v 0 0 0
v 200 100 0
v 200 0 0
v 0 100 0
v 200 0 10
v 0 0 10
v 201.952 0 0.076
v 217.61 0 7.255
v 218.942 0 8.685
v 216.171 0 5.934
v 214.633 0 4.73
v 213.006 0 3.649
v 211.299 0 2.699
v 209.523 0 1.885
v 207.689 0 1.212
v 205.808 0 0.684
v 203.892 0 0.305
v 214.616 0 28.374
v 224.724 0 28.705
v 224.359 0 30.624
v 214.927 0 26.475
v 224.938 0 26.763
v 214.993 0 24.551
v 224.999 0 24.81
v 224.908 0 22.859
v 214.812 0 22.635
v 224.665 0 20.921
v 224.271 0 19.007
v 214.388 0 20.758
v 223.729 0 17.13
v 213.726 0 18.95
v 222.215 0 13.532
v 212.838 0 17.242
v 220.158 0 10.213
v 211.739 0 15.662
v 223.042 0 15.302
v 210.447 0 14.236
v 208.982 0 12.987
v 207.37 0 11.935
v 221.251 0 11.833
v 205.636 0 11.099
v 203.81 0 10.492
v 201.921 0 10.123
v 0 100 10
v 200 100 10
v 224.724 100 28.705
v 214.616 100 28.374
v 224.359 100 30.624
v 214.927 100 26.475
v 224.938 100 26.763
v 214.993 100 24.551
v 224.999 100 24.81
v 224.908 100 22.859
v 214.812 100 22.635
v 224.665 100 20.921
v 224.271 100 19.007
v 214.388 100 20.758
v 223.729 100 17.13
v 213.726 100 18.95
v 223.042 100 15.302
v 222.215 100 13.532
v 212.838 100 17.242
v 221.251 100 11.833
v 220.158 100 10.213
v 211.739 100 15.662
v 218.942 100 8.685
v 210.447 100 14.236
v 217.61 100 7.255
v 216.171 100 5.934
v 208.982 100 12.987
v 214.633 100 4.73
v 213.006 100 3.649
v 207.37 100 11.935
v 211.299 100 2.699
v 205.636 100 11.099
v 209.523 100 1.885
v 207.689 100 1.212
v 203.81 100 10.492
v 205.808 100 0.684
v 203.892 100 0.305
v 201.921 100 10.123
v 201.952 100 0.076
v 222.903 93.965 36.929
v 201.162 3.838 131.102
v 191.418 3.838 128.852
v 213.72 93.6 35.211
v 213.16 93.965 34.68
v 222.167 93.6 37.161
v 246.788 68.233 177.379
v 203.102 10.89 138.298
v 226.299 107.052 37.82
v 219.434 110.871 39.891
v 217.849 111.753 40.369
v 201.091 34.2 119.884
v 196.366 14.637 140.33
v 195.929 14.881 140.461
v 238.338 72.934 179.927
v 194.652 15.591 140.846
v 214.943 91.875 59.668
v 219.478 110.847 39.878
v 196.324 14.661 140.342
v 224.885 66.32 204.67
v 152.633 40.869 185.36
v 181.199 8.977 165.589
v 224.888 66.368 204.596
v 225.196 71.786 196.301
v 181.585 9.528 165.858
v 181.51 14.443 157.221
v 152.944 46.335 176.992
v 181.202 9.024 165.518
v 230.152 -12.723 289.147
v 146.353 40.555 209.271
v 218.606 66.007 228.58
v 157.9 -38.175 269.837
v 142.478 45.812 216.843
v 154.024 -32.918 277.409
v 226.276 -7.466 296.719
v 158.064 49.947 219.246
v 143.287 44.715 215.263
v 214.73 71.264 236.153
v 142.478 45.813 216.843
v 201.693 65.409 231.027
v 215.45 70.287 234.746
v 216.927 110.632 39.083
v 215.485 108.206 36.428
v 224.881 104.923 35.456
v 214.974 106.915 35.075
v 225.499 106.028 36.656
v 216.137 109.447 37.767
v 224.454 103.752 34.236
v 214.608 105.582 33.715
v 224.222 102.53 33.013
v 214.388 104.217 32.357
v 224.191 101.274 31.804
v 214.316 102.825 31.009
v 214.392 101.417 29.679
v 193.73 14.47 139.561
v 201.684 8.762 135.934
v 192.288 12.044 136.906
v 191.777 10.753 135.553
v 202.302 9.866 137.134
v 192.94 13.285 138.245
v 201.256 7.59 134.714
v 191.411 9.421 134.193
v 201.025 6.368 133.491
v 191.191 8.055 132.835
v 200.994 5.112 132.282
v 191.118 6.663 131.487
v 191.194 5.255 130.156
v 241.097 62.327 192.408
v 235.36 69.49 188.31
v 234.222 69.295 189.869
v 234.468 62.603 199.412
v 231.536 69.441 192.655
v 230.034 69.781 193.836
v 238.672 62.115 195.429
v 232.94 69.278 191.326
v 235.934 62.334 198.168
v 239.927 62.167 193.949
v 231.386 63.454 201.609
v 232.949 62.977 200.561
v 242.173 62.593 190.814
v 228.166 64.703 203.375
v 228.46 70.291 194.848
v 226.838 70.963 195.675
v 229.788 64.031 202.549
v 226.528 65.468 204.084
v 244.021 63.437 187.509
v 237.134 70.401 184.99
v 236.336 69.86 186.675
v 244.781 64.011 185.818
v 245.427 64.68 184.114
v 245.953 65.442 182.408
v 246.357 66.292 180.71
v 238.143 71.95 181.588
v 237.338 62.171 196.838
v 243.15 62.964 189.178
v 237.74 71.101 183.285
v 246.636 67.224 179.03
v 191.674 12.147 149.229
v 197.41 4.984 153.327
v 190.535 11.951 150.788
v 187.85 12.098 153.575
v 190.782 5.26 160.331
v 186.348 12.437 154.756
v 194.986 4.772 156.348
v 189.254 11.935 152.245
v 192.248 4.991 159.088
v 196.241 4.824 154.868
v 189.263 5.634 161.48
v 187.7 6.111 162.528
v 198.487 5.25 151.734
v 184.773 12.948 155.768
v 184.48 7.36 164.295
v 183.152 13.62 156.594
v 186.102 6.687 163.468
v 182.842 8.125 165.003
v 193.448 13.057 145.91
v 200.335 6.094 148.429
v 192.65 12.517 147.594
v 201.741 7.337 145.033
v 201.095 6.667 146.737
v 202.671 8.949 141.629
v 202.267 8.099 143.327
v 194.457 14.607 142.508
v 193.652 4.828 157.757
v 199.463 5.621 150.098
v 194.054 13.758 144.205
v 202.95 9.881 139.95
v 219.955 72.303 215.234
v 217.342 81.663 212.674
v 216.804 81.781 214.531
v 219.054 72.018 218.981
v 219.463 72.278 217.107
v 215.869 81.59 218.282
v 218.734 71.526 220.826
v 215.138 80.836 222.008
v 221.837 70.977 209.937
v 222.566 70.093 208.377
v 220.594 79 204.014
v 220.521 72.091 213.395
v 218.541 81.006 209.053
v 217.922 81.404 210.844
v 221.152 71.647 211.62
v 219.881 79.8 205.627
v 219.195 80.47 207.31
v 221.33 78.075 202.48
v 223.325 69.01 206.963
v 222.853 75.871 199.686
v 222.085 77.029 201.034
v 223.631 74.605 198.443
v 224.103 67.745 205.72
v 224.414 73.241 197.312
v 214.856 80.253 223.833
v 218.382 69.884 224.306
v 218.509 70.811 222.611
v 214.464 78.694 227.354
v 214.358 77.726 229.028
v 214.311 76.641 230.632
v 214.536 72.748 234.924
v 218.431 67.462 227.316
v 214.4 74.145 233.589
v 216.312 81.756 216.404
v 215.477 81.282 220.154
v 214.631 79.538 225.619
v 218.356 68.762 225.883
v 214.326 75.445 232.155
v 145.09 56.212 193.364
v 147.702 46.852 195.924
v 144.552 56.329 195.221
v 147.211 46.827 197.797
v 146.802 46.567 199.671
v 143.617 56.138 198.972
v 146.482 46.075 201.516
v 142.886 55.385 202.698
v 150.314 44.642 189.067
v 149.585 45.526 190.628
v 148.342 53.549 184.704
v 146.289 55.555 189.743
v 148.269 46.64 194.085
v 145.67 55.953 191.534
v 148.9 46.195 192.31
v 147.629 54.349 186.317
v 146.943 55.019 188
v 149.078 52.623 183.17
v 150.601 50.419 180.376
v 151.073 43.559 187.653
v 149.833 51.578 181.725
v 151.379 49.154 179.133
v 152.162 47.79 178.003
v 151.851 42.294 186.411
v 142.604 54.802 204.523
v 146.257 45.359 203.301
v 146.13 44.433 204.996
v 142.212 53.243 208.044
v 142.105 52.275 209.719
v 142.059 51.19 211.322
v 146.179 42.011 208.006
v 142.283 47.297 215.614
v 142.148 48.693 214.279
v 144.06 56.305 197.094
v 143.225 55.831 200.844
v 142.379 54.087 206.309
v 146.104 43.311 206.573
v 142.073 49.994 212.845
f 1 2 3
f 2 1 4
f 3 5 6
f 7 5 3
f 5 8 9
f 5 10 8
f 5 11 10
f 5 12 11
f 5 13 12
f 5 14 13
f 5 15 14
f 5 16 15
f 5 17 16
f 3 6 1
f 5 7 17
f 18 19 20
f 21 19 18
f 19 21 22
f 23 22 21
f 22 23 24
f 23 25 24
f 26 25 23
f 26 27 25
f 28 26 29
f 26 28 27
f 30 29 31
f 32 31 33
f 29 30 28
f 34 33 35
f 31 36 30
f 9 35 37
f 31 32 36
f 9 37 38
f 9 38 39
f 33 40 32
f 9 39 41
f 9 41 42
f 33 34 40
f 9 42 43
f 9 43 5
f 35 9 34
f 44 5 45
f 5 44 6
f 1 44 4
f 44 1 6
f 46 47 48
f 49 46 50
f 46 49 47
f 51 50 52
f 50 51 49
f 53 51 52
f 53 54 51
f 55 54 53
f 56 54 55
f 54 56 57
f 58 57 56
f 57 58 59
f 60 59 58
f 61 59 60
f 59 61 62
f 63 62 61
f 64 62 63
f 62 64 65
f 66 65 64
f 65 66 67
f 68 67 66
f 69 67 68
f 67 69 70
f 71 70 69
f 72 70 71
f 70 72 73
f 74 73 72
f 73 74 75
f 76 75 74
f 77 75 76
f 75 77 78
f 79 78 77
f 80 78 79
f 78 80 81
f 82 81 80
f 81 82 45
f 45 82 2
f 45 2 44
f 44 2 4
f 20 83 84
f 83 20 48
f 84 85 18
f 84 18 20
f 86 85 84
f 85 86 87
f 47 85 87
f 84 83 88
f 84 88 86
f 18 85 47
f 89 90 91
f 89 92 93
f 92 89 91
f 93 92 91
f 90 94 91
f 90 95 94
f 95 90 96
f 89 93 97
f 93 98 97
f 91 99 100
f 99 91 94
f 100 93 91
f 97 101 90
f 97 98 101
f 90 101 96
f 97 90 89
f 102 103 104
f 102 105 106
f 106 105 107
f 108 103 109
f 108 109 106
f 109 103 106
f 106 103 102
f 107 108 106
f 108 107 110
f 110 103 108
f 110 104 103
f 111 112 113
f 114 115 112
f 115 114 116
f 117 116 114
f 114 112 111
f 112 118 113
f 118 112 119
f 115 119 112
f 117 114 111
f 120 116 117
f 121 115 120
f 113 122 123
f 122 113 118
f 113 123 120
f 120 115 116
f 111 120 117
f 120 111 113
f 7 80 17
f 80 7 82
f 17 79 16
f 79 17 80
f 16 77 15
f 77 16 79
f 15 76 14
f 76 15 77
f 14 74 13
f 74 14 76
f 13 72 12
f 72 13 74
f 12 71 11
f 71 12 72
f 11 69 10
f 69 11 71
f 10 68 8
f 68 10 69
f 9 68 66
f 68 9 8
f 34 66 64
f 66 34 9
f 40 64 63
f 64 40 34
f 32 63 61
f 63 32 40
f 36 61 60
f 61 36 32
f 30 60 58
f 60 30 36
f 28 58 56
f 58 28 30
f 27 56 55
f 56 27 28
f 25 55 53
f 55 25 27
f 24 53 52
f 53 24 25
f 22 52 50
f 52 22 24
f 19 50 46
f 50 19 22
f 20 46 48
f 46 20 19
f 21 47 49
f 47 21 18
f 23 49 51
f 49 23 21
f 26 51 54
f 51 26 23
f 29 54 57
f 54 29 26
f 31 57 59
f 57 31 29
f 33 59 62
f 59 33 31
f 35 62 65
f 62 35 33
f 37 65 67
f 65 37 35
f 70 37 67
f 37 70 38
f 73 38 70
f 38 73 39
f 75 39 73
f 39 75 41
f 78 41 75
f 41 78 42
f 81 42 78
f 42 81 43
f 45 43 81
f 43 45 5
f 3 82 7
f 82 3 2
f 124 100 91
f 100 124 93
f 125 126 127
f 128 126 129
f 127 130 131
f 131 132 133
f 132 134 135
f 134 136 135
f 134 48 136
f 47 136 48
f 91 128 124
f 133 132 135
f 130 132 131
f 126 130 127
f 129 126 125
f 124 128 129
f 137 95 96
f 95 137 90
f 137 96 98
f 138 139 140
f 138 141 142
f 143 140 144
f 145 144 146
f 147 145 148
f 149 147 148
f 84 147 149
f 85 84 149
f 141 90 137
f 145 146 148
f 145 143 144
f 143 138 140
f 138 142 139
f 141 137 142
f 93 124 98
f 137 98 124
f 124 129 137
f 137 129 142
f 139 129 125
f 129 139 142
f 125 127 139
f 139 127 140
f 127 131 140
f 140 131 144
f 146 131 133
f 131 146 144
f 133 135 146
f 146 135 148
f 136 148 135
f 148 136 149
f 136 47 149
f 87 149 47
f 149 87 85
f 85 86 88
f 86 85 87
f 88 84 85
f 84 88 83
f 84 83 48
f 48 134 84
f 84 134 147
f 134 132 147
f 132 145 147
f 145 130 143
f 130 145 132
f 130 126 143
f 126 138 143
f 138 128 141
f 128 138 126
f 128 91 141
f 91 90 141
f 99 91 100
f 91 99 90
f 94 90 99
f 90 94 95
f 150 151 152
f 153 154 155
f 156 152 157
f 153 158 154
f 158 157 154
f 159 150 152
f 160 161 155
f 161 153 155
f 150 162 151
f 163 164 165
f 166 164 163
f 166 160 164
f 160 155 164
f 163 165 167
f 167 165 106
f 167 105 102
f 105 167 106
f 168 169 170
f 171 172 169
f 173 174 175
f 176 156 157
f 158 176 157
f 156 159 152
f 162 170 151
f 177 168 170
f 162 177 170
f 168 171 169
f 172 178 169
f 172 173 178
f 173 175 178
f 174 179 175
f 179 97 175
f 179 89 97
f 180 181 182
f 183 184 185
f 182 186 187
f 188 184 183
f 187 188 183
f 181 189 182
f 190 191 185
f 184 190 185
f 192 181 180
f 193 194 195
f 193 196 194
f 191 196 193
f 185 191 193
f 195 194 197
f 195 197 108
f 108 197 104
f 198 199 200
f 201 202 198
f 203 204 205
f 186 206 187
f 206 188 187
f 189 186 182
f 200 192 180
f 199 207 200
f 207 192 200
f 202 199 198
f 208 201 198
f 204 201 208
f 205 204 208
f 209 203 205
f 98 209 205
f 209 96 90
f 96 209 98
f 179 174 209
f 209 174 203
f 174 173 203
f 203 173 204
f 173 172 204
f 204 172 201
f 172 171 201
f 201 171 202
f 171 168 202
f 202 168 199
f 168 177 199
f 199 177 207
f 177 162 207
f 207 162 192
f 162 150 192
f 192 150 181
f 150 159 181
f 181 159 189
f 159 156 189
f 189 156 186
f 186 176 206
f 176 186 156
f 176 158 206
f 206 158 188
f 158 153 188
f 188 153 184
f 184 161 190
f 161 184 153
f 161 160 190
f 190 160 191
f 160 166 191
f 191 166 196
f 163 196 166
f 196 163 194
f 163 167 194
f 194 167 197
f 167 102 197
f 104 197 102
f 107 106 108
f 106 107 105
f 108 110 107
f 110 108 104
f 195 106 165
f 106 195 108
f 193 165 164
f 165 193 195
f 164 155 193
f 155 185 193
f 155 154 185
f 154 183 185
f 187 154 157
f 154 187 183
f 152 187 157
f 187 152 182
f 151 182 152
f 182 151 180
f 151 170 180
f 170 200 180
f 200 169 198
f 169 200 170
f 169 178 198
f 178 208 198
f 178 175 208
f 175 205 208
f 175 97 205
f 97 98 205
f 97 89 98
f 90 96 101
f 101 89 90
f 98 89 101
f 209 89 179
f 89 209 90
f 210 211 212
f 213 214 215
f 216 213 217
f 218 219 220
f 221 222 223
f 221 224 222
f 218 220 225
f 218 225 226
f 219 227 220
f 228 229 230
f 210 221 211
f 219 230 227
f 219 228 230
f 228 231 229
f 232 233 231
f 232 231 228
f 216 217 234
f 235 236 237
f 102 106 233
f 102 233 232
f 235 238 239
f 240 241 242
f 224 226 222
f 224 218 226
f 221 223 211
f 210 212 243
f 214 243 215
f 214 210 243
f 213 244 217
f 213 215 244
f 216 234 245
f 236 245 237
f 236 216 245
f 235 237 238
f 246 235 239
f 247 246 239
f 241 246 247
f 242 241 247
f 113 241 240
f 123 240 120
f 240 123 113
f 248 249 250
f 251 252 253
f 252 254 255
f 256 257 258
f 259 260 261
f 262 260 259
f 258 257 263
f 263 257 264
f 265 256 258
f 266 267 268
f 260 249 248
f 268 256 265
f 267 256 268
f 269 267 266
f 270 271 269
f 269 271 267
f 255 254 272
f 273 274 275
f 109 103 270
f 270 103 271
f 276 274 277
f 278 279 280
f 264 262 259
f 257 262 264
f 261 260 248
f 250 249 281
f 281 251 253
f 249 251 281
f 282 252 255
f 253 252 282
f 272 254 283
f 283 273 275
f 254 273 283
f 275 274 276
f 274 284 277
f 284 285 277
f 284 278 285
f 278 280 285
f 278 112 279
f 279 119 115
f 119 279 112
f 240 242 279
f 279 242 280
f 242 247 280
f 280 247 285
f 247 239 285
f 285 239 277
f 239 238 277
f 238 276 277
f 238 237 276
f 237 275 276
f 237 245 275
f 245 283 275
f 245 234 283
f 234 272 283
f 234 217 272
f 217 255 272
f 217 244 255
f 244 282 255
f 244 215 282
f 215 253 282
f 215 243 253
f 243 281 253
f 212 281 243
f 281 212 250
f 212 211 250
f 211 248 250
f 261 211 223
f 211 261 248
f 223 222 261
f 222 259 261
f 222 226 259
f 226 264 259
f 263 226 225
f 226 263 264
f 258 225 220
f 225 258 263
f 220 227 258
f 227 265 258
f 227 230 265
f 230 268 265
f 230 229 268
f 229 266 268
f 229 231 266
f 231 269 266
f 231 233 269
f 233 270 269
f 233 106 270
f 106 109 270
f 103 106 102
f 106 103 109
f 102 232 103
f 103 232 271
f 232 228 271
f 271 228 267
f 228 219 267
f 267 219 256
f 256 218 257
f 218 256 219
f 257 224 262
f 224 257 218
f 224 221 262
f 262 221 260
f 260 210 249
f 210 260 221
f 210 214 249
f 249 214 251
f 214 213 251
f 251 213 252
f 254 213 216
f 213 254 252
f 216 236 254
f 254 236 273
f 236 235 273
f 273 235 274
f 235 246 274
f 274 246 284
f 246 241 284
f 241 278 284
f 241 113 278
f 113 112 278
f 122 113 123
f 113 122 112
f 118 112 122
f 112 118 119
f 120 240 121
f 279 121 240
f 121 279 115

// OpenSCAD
// Generated by Parametrix
ca_demoSheetFold2_facePattern_000 = [ [ 0.0000, 0.0000 ],[ 200.0000, 0.0000 ],[ 200.0000, 100.0000 ],[ 0.0000, 100.0000 ],[ 0.0000, 0.0000 ] ];
cb_demoSheetFold2_facePattern_000 = [  0, 1, 2, 3, 4 ];
ca_demoSheetFold2_facePattern_001 = [ [ 0.0000, 0.0000 ],[ 100.0000, 0.0000 ],[ 96.1618, 103.1209 ],[ 0.0000, 0.0000 ] ];
cb_demoSheetFold2_facePattern_001 = [  5, 6, 7, 8 ];
ca_demoSheetFold2_facePattern_002 = [ [ 0.0000, 0.0000 ],[ 82.0000, 0.0000 ],[ 31.7181, 137.3862 ],[ 0.0000, 0.0000 ] ];
cb_demoSheetFold2_facePattern_002 = [  9, 10, 11, 12 ];
ca_demoSheetFold2_facePattern_003 = [ [ 0.0000, 0.0000 ],[ 82.0000, 0.0000 ],[ 65.4940, 44.1762 ],[ 0.0000, 0.0000 ] ];
cb_demoSheetFold2_facePattern_003 = [  13, 14, 15, 16 ];
ca_demoSheetFold2_facePattern_004 = [ [ 0.0000, 0.0000 ],[ 100.0000, 0.0000 ],[ 100.0000, 79.0000 ],[ 0.0000, 79.0000 ],[ 0.0000, 0.0000 ] ];
cb_demoSheetFold2_facePattern_004 = [  17, 18, 19, 20, 21 ];
a_demoSheetFold2_facePattern = concat(ca_demoSheetFold2_facePattern_000, ca_demoSheetFold2_facePattern_001, ca_demoSheetFold2_facePattern_002, ca_demoSheetFold2_facePattern_003, ca_demoSheetFold2_facePattern_004);
b_demoSheetFold2_facePattern = [cb_demoSheetFold2_facePattern_000, cb_demoSheetFold2_facePattern_001, cb_demoSheetFold2_facePattern_002, cb_demoSheetFold2_facePattern_003, cb_demoSheetFold2_facePattern_004];
ca_demoSheetFold2_SFG_f00_000 = [ [ 0.0000, 0.0000 ],[ 200.0000, 0.0000 ],[ 200.0000, 100.0000 ],[ 0.0000, 100.0000 ],[ 0.0000, 0.0000 ] ];
cb_demoSheetFold2_SFG_f00_000 = [  0, 1, 2, 3, 4 ];
a_demoSheetFold2_SFG_f00 = concat(ca_demoSheetFold2_SFG_f00_000);
b_demoSheetFold2_SFG_f00 = [cb_demoSheetFold2_SFG_f00_000];
ca_demoSheetFold2_SFG_f01_000 = [ [ 0.0000, 100.0000 ],[ 0.0000, 0.0000 ],[ 103.1209, 3.8382 ],[ 0.0000, 100.0000 ] ];
cb_demoSheetFold2_SFG_f01_000 = [  0, 1, 2, 3 ];
a_demoSheetFold2_SFG_f01 = concat(ca_demoSheetFold2_SFG_f01_000);
b_demoSheetFold2_SFG_f01 = [cb_demoSheetFold2_SFG_f01_000];
ca_demoSheetFold2_SFG_f02_000 = [ [ 0.0000, 0.0000 ],[ 79.8983, 18.4460 ],[ 0.0000, 141.0000 ],[ 0.0000, 0.0000 ] ];
cb_demoSheetFold2_SFG_f02_000 = [  0, 1, 2, 3 ];
a_demoSheetFold2_SFG_f02 = concat(ca_demoSheetFold2_SFG_f02_000);
b_demoSheetFold2_SFG_f02 = [cb_demoSheetFold2_SFG_f02_000];
ca_demoSheetFold2_SFG_f03_000 = [ [ 0.0000, 82.0000 ],[ 0.0000, 0.0000 ],[ 44.1762, 16.5060 ],[ 0.0000, 82.0000 ] ];
cb_demoSheetFold2_SFG_f03_000 = [  0, 1, 2, 3 ];
a_demoSheetFold2_SFG_f03 = concat(ca_demoSheetFold2_SFG_f03_000);
b_demoSheetFold2_SFG_f03 = [cb_demoSheetFold2_SFG_f03_000];
ca_demoSheetFold2_SFG_f04_000 = [ [ -0.0000, 0.0000 ],[ 100.0000, 0.0000 ],[ 100.0000, 79.0000 ],[ -0.0000, 79.0000 ],[ -0.0000, 0.0000 ] ];
cb_demoSheetFold2_SFG_f04_000 = [  0, 1, 2, 3, 4 ];
a_demoSheetFold2_SFG_f04 = concat(ca_demoSheetFold2_SFG_f04_000);
b_demoSheetFold2_SFG_f04 = [cb_demoSheetFold2_SFG_f04_000];
ca_demoSheetFold2_SFG_fj00_000 = [ [ 0.0000, 0.0000 ],[ 1.9520, 0.0763 ],[ 3.8921, 0.3048 ],[ 5.8085, 0.6841 ],[ 7.6893, 1.2119 ],[ 9.5233, 1.8849 ],[ 11.2990, 2.6991 ],[ 13.0058, 3.6494 ],[ 14.6332, 4.7301 ],[ 16.1712, 5.9345 ],[ 17.6105, 7.2554 ],[ 18.9422, 8.6846 ],[ 20.1583, 10.2134 ],[ 21.2513, 11.8326 ],[ 22.2146, 13.5321 ],[ 23.0422, 15.3016 ],[ 23.7291, 17.1304 ],[ 24.2711, 19.0072 ],[ 24.6649, 20.9206 ],[ 24.9081, 22.8589 ],[ 24.9993, 24.8103 ],[ 24.9378, 26.7628 ],[ 24.7240, 28.7046 ],[ 24.3593, 30.6238 ],[ 14.6156, 28.3743 ],[ 14.9273, 26.4749 ],[ 14.9933, 24.5513 ],[ 14.8124, 22.6350 ],[ 14.3876, 20.7577 ],[ 13.7259, 18.9502 ],[ 12.8382, 17.2424 ],[ 11.7391, 15.6623 ],[ 10.4467, 14.2359 ],[ 8.9824, 12.9868 ],[ 7.3701, 11.9355 ],[ 5.6364, 11.0993 ],[ 3.8100, 10.4919 ],[ 1.9208, 10.1235 ],[ -0.0000, 10.0000 ],[ 0.0000, 0.0000 ] ];
cb_demoSheetFold2_SFG_fj00_000 = [  0, 1, 2, 3, 4, 5, 6, 7, 8, 9, 10, 11, 12, 13, 14, 15, 16, 17, 18, 19, 20, 21, 22, 23, 24, 25, 26, 27, 28, 29, 30, 31, 32, 33, 34, 35, 36, 37, 38, 39 ];
a_demoSheetFold2_SFG_fj00 = concat(ca_demoSheetFold2_SFG_fj00_000);
b_demoSheetFold2_SFG_fj00 = [cb_demoSheetFold2_SFG_fj00_000];
ca_demoSheetFold2_SFG_fj01_000 = [ [ 0.0000, 0.0000 ],[ 1.7414, -0.1014 ],[ 3.4592, -0.4043 ],[ 5.1303, -0.9046 ],[ 6.7320, -1.5955 ],[ 8.2426, -2.4677 ],[ 9.6418, -3.5093 ],[ 16.0697, 4.1511 ],[ 14.5373, 5.3388 ],[ 12.9175, 6.4042 ],[ 11.2200, 7.3408 ],[ 9.4550, 8.1431 ],[ 7.6331, 8.8062 ],[ 5.7654, 9.3261 ],[ 3.8630, 9.6997 ],[ 1.9373, 9.9248 ],[ 0.0000, 10.0000 ],[ 0.0000, 0.0000 ] ];
cb_demoSheetFold2_SFG_fj01_000 = [  0, 1, 2, 3, 4, 5, 6, 7, 8, 9, 10, 11, 12, 13, 14, 15, 16, 17 ];
a_demoSheetFold2_SFG_fj01 = concat(ca_demoSheetFold2_SFG_fj01_000);
b_demoSheetFold2_SFG_fj01 = [cb_demoSheetFold2_SFG_fj01_000];
ca_demoSheetFold2_SFG_fj02_000 = [ [ 0.0000, 0.0000 ],[ 1.9397, 0.0754 ],[ 3.8678, 0.3010 ],[ 5.7725, 0.6756 ],[ 7.6424, 1.1968 ],[ 9.4662, 1.8615 ],[ 11.2330, 2.6657 ],[ 12.9320, 3.6046 ],[ 14.5531, 4.6725 ],[ 16.0864, 5.8629 ],[ 17.5227, 7.1687 ],[ 18.8534, 8.5821 ],[ 20.0704, 10.0944 ],[ 21.1664, 11.6966 ],[ 22.1348, 13.3789 ],[ 22.9698, 15.1314 ],[ 23.6662, 16.9434 ],[ 24.2200, 18.8039 ],[ 24.6277, 20.7018 ],[ 24.8870, 22.6256 ],[ 24.9962, 24.5637 ],[ 14.9977, 24.7382 ],[ 14.8384, 22.8044 ],[ 14.4309, 20.9074 ],[ 13.7819, 19.0788 ],[ 12.9022, 17.3494 ],[ 11.8067, 15.7479 ],[ 10.5136, 14.3012 ],[ 9.0446, 13.0336 ],[ 7.4243, 11.9662 ],[ 5.6797, 11.1169 ],[ 3.8401, 10.4999 ],[ 1.9363, 10.1255 ],[ -0.0000, 10.0000 ],[ 0.0000, 0.0000 ] ];
cb_demoSheetFold2_SFG_fj02_000 = [  0, 1, 2, 3, 4, 5, 6, 7, 8, 9, 10, 11, 12, 13, 14, 15, 16, 17, 18, 19, 20, 21, 22, 23, 24, 25, 26, 27, 28, 29, 30, 31, 32, 33, 34 ];
a_demoSheetFold2_SFG_fj02 = concat(ca_demoSheetFold2_SFG_fj02_000);
b_demoSheetFold2_SFG_fj02 = [cb_demoSheetFold2_SFG_fj02_000];
ca_demoSheetFold2_SFG_fj03_000 = [ [ 0.0000, 0.0000 ],[ 1.9319, -0.1249 ],[ 3.8317, -0.4976 ],[ 5.6676, -1.1119 ],[ 7.4091, -1.9576 ],[ 9.0272, -3.0205 ],[ 10.4950, -4.2829 ],[ 11.7879, -5.7239 ],[ 12.8844, -7.3194 ],[ 13.7663, -9.0428 ],[ 14.4189, -10.8654 ],[ 14.8313, -12.7570 ],[ 14.9967, -14.6859 ],[ 14.9123, -16.6200 ],[ 14.5794, -18.5271 ],[ 14.0037, -20.3755 ],[ 23.3395, -23.9592 ],[ 23.9630, -22.1255 ],[ 24.4428, -20.2490 ],[ 24.7757, -18.3410 ],[ 24.9600, -16.4130 ],[ 24.9945, -14.4764 ],[ 24.8790, -12.5431 ],[ 24.6141, -10.6244 ],[ 24.2015, -8.7321 ],[ 23.6436, -6.8773 ],[ 22.9439, -5.0713 ],[ 22.1064, -3.3249 ],[ 21.1362, -1.6486 ],[ 20.0392, -0.0524 ],[ 18.8219, 1.4541 ],[ 17.4916, 2.8618 ],[ 16.0563, 4.1623 ],[ 14.5247, 5.3478 ],[ 12.9059, 6.4112 ],[ 11.2096, 7.3460 ],[ 9.4460, 8.1468 ],[ 7.6258, 8.8086 ],[ 5.7597, 9.3275 ],[ 3.8591, 9.7003 ],[ 1.9354, 9.9250 ],[ -0.0000, 10.0000 ],[ 0.0000, 0.0000 ] ];
cb_demoSheetFold2_SFG_fj03_000 = [  0, 1, 2, 3, 4, 5, 6, 7, 8, 9, 10, 11, 12, 13, 14, 15, 16, 17, 18, 19, 20, 21, 22, 23, 24, 25, 26, 27, 28, 29, 30, 31, 32, 33, 34, 35, 36, 37, 38, 39, 40, 41, 42 ];
a_demoSheetFold2_SFG_fj03 = concat(ca_demoSheetFold2_SFG_fj03_000);
b_demoSheetFold2_SFG_fj03 = [cb_demoSheetFold2_SFG_fj03_000];

module subpax_SFG_f00 () {
	translate( [ 0, 0, 0 ])
		rotate( [ 0, 0, 0 ])
			   linear_extrude(height = 10) polygon(a_demoSheetFold2_SFG_f00, b_demoSheetFold2_SFG_f00);
}

module subpax_SFG_f01 () {
	translate( [ 224.35925161963087, -1.491573976280297e-15, 30.623776358596622 ])
		rotate( [ -180, -77.00000000000001, 180 ])
			   linear_extrude(height = 10) polygon(a_demoSheetFold2_SFG_f01, b_demoSheetFold2_SFG_f01);
}

module subpax_SFG_f02 () {
	translate( [ 203.10228115034502, 10.889807696675593, 138.29826189128397 ])
		rotate( [ -70.32345575808665, -40.81711310115356, 47.755907866655484 ])
			   linear_extrude(height = 10) polygon(a_demoSheetFold2_SFG_f02, b_demoSheetFold2_SFG_f02);
}

module subpax_SFG_f03 () {
	translate( [ 181.19929063609473, 8.977121768001256, 165.58901364026133 ])
		rotate( [ 150.3369702601177, -15.63257020176953, 151.42366606217595 ])
			   linear_extrude(height = 10) polygon(a_demoSheetFold2_SFG_f03, b_demoSheetFold2_SFG_f03);
}

module subpax_SFG_f04 () {
	translate( [ 146.35346234249107, 40.555434529768974, 209.27058884358186 ])
		rotate( [ 17.889221437164085, -37.2764503584925, -81.6565645325222 ])
			   linear_extrude(height = 10) polygon(a_demoSheetFold2_SFG_f04, b_demoSheetFold2_SFG_f04);
}

module subpax_SFG_fj00 () {
	translate( [ 200, 100, 0 ])
		rotate( [ 90, 0, 0 ])
			   linear_extrude(height = 100) polygon(a_demoSheetFold2_SFG_fj00, b_demoSheetFold2_SFG_fj00);
}

module subpax_SFG_fj01 () {
	translate( [ 224.3592516196309, 99.99999999999996, 30.62377635859654 ])
		rotate( [ -17.51946952527892, -41.64541857433313, 101.84717093278336 ])
			   linear_extrude(height = 141) polygon(a_demoSheetFold2_SFG_fj01, b_demoSheetFold2_SFG_fj01);
}

module subpax_SFG_fj02 () {
	translate( [ 246.7884187506262, 68.23294335421211, 177.37877077398235 ])
		rotate( [ 151.86766644957882, -57.28650723371975, -94.86668406721826 ])
			   linear_extrude(height = 82) polygon(a_demoSheetFold2_SFG_fj02, b_demoSheetFold2_SFG_fj02);
}

module subpax_SFG_fj03 () {
	translate( [ 224.88542823637593, 66.32025742553773, 204.66952252295968 ])
		rotate( [ -106.28286071439182, -29.334346629606852, 117.54879601542736 ])
			   linear_extrude(height = 79) polygon(a_demoSheetFold2_SFG_fj03, b_demoSheetFold2_SFG_fj03);
}

module pax_demoSheetFold2 () {
	union () {
		subpax_SFG_f00();
subpax_SFG_f01();
subpax_SFG_f02();
subpax_SFG_f03();
subpax_SFG_f04();
subpax_SFG_fj00();
subpax_SFG_fj01();
subpax_SFG_fj02();
subpax_SFG_fj03();
	}
}

pax_demoSheetFold2();
